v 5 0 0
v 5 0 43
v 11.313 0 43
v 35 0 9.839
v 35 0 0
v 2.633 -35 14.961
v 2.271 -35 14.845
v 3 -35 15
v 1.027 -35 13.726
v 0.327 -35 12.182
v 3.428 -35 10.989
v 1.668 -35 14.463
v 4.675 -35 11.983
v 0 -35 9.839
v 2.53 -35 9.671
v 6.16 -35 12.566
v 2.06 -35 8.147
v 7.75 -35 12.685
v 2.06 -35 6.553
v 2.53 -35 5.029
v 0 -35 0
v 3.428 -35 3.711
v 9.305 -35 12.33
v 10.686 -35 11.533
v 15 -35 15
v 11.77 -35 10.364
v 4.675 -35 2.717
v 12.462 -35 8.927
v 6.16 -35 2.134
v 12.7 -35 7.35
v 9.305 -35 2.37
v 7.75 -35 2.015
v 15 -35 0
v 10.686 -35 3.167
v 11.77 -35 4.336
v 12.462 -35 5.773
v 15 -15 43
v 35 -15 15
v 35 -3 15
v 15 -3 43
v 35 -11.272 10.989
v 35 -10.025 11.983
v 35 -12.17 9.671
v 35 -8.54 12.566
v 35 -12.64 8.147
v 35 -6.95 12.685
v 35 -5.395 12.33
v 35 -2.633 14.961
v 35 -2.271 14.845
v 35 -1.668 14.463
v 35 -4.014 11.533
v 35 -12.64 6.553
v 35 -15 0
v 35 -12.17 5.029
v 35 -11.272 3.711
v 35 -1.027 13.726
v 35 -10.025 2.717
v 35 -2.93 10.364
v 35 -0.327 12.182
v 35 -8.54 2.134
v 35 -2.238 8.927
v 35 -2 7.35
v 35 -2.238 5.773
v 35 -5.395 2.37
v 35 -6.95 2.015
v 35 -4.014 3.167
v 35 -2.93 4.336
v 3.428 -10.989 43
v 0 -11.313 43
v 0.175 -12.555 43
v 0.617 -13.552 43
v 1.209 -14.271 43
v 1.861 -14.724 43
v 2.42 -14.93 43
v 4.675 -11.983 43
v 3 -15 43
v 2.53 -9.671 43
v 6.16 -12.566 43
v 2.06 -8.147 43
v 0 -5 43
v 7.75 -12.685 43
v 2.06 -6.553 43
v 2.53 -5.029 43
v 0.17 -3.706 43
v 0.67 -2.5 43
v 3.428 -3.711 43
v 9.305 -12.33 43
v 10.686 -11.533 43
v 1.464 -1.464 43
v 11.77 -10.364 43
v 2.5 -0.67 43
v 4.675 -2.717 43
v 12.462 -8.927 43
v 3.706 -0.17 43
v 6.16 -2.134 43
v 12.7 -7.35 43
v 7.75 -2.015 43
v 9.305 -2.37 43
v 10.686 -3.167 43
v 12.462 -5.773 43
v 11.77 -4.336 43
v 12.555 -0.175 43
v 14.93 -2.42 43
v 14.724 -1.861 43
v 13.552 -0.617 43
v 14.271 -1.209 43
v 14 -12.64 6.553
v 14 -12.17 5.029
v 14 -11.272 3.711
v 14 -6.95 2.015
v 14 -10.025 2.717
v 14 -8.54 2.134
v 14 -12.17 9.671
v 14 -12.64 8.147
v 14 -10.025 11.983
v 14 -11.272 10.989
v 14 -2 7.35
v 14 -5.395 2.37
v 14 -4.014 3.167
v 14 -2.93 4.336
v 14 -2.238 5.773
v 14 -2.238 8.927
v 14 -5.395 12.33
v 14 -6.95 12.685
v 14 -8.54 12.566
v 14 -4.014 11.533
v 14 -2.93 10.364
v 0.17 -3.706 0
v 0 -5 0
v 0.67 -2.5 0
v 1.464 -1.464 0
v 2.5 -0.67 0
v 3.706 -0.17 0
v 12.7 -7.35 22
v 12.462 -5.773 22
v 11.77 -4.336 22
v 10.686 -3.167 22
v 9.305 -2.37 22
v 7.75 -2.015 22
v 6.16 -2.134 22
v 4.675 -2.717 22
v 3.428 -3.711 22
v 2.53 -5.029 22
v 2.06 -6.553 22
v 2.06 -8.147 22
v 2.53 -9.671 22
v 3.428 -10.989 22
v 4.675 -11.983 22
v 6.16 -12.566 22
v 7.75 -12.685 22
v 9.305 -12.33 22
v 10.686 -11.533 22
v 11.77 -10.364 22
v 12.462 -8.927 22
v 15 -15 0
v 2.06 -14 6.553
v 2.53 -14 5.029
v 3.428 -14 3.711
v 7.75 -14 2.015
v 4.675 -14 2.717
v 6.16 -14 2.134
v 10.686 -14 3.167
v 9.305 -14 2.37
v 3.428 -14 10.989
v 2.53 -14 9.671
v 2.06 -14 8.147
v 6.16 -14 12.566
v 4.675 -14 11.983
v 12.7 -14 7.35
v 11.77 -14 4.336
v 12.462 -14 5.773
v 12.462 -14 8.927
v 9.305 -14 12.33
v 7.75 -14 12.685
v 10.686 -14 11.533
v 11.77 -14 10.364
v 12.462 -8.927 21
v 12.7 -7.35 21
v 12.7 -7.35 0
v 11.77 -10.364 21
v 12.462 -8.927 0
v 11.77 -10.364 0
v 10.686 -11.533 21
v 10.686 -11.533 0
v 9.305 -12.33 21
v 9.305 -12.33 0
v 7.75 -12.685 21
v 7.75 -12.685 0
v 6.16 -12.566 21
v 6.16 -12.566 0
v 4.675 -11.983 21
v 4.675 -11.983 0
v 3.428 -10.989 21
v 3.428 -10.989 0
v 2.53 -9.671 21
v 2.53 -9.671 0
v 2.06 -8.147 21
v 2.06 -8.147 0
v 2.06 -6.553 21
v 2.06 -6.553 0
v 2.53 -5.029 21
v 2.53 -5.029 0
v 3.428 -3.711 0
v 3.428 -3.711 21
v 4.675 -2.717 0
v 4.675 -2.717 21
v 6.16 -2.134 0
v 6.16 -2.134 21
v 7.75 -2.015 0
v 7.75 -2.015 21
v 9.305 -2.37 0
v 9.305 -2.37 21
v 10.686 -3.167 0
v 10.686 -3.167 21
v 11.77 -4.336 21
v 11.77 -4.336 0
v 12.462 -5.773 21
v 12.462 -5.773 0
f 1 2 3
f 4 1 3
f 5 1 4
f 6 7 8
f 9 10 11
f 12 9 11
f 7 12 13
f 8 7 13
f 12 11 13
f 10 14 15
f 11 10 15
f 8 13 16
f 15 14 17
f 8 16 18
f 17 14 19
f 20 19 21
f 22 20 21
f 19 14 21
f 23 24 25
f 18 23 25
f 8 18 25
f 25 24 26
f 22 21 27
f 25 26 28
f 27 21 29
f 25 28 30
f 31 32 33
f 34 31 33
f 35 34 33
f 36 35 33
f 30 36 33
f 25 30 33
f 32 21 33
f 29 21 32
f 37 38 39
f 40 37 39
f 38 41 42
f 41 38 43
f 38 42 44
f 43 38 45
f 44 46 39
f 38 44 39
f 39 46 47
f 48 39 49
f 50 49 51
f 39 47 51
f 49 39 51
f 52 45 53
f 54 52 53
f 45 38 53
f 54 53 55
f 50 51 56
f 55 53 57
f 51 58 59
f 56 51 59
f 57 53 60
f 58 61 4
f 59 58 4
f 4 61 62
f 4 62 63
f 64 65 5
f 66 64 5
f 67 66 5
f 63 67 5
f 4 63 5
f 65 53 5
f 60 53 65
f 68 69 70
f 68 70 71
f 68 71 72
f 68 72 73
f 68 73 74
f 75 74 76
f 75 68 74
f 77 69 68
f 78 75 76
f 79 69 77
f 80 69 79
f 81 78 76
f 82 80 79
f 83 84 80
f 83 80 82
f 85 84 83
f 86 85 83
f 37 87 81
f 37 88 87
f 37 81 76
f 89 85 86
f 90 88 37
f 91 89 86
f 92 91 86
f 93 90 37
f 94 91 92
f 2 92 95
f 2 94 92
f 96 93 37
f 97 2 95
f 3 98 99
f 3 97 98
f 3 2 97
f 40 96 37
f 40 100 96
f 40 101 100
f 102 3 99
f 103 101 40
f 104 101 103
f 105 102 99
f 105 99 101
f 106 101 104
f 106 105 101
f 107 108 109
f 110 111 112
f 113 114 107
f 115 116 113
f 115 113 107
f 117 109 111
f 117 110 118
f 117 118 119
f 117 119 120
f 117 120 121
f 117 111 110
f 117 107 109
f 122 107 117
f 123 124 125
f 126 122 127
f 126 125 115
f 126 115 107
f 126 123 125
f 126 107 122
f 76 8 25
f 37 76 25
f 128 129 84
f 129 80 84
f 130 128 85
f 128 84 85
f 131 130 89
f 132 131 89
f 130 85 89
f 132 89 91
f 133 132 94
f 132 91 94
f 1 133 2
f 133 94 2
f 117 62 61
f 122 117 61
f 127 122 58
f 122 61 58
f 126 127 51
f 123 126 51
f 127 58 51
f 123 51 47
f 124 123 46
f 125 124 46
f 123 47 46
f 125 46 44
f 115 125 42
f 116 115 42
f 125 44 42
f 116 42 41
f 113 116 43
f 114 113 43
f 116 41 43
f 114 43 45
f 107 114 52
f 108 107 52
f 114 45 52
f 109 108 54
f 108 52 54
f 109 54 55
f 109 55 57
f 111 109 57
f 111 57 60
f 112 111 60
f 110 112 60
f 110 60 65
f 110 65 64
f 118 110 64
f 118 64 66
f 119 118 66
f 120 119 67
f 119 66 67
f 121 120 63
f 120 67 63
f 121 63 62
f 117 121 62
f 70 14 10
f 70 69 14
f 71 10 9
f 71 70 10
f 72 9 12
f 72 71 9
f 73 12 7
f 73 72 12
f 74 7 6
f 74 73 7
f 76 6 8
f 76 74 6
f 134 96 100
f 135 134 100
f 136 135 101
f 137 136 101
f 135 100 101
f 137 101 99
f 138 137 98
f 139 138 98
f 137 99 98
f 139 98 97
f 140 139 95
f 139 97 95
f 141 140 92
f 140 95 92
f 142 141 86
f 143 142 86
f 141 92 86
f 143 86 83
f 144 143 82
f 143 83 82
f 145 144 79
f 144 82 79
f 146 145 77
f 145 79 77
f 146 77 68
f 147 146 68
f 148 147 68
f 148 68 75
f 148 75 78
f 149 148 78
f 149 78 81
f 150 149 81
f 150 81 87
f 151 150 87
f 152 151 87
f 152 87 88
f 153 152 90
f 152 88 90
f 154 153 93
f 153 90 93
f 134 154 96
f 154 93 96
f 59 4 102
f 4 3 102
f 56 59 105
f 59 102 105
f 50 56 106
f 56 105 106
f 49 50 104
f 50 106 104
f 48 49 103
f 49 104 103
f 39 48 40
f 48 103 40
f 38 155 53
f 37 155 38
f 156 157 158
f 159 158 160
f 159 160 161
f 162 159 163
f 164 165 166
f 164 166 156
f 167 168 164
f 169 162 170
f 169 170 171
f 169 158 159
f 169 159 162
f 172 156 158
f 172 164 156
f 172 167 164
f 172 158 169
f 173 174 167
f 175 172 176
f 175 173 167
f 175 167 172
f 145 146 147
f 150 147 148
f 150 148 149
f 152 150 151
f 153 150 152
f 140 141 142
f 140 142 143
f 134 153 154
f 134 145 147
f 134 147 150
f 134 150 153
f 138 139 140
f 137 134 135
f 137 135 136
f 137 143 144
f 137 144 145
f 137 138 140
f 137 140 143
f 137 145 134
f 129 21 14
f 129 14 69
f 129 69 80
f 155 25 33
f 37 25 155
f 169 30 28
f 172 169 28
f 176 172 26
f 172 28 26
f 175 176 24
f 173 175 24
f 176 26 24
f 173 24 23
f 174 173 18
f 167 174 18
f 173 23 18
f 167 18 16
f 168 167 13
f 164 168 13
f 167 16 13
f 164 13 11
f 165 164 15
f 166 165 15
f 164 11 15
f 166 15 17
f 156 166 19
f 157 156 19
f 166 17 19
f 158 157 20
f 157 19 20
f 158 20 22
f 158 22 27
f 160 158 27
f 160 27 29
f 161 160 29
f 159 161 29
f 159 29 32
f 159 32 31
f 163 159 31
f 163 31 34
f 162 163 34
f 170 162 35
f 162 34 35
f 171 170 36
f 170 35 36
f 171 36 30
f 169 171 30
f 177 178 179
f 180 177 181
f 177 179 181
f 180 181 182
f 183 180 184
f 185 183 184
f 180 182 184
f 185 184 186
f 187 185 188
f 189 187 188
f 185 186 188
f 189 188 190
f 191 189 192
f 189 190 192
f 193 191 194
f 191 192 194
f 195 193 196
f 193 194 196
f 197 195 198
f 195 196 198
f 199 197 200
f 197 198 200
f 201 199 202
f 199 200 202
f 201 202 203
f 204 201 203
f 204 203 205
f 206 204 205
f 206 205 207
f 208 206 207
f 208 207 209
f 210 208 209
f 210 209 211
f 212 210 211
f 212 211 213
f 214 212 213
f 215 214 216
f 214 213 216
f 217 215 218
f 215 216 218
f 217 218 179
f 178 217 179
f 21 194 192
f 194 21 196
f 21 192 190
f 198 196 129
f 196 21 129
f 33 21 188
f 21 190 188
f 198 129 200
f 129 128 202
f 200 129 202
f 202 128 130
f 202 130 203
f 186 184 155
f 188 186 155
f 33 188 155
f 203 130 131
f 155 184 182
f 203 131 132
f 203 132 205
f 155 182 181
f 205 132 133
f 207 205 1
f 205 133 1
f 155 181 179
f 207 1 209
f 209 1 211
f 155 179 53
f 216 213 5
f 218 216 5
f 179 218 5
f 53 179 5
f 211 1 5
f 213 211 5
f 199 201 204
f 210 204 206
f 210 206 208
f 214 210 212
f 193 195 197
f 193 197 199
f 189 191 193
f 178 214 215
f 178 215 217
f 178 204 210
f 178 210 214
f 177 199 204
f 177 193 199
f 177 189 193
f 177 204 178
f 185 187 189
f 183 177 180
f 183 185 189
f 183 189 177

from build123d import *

# Parameters (mm, degrees)
F0_W        = 35
F0_H        = 35
F1_DEPTH    = 43
F2_R        = 5.35
F3_DEPTH    = 21
F4_R        = 5.35
F5_DEPTH    = 21
F6_R        = 5.35
F7_DEPTH    = 21
F8_W        = 20
F8_H        = 20
F9_DEPTH    = 43.001
F10_R       = 5.35
F11_DEPTH   = 21
F12_SIZE2   = 20
F12_SIZE    = 28
F12_2_SIZE2 = 20
F12_2_SIZE  = 28
F13_R       = 5
F14_R       = 3


with BuildPart() as f1:
    # F0 (on Top) → F1 (new body)
    with BuildSketch(Plane.XY):
        with Locations((17.5, -17.5)):
            Rectangle(F0_W, F0_H)
    extrude(amount=F1_DEPTH)

    # F2 (on face) → F3 (cut)
    with BuildSketch(Plane.XZ.offset(35)):
        with Locations((7.35, 7.35)):
            Circle(F2_R)
    extrude(amount=-F3_DEPTH, mode=Mode.SUBTRACT)

    # F4 (on face) → F5 (cut)
    with BuildSketch(Plane.YZ.offset(35)):
        with Locations((-7.35, 7.35)):
            Circle(F4_R)
    extrude(amount=-F5_DEPTH, mode=Mode.SUBTRACT)

    # F6 (on face) → F7 (cut)
    with BuildSketch(Plane.XY.offset(43)):
        with Locations((7.35, -7.35)):
            Circle(F6_R)
    extrude(amount=-F7_DEPTH, mode=Mode.SUBTRACT)

    # F8 (on face) → F9 (cut, through all)
    with BuildSketch(Plane.XY.offset(43)):
        with Locations((25, -25)):
            Rectangle(F8_W, F8_H)
    extrude(amount=-F9_DEPTH, mode=Mode.SUBTRACT)

    # F10 (on face) → F11 (cut)
    with BuildSketch(Plane(origin=(0, 0, 0), x_dir=(1, 0, 0), z_dir=(0, 0, -1))):
        with Locations((7.35, 7.35)):
            Circle(F10_R)
    extrude(amount=-F11_DEPTH, mode=Mode.SUBTRACT)

    # F12
    f12_edges = [f1.edges().sort_by_distance(p)[0] for p in [
        (35, -7.5, 43),
    ]]
    f12_side = f1.faces().sort_by_distance((35, -7.524299, 23.792232))[0]
    chamfer(f12_edges, length=F12_SIZE, length2=F12_SIZE2, reference=f12_side)

    # F12#2
    f12_2_edges = [f1.edges().sort_by_distance(p)[0] for p in [
        (7.5, -35, 43),
    ]]
    f12_2_side = f1.faces().sort_by_distance((7.524299, -35, 23.792232))[0]
    chamfer(f12_2_edges, length=F12_2_SIZE, length2=F12_2_SIZE2, reference=f12_2_side)

    # F13
    f13_edges = [f1.edges().sort_by_distance(p)[0] for p in [
        (0, 0, 21.5),
    ]]
    fillet(f13_edges, radius=F13_R)

    # F14
    f14_edges = [f1.edges().sort_by_distance(p)[0] for p in [
        (0, -25, 29),
        (25, 0, 29),
    ]]
    fillet(f14_edges, radius=F14_R)


solid = f1.part
